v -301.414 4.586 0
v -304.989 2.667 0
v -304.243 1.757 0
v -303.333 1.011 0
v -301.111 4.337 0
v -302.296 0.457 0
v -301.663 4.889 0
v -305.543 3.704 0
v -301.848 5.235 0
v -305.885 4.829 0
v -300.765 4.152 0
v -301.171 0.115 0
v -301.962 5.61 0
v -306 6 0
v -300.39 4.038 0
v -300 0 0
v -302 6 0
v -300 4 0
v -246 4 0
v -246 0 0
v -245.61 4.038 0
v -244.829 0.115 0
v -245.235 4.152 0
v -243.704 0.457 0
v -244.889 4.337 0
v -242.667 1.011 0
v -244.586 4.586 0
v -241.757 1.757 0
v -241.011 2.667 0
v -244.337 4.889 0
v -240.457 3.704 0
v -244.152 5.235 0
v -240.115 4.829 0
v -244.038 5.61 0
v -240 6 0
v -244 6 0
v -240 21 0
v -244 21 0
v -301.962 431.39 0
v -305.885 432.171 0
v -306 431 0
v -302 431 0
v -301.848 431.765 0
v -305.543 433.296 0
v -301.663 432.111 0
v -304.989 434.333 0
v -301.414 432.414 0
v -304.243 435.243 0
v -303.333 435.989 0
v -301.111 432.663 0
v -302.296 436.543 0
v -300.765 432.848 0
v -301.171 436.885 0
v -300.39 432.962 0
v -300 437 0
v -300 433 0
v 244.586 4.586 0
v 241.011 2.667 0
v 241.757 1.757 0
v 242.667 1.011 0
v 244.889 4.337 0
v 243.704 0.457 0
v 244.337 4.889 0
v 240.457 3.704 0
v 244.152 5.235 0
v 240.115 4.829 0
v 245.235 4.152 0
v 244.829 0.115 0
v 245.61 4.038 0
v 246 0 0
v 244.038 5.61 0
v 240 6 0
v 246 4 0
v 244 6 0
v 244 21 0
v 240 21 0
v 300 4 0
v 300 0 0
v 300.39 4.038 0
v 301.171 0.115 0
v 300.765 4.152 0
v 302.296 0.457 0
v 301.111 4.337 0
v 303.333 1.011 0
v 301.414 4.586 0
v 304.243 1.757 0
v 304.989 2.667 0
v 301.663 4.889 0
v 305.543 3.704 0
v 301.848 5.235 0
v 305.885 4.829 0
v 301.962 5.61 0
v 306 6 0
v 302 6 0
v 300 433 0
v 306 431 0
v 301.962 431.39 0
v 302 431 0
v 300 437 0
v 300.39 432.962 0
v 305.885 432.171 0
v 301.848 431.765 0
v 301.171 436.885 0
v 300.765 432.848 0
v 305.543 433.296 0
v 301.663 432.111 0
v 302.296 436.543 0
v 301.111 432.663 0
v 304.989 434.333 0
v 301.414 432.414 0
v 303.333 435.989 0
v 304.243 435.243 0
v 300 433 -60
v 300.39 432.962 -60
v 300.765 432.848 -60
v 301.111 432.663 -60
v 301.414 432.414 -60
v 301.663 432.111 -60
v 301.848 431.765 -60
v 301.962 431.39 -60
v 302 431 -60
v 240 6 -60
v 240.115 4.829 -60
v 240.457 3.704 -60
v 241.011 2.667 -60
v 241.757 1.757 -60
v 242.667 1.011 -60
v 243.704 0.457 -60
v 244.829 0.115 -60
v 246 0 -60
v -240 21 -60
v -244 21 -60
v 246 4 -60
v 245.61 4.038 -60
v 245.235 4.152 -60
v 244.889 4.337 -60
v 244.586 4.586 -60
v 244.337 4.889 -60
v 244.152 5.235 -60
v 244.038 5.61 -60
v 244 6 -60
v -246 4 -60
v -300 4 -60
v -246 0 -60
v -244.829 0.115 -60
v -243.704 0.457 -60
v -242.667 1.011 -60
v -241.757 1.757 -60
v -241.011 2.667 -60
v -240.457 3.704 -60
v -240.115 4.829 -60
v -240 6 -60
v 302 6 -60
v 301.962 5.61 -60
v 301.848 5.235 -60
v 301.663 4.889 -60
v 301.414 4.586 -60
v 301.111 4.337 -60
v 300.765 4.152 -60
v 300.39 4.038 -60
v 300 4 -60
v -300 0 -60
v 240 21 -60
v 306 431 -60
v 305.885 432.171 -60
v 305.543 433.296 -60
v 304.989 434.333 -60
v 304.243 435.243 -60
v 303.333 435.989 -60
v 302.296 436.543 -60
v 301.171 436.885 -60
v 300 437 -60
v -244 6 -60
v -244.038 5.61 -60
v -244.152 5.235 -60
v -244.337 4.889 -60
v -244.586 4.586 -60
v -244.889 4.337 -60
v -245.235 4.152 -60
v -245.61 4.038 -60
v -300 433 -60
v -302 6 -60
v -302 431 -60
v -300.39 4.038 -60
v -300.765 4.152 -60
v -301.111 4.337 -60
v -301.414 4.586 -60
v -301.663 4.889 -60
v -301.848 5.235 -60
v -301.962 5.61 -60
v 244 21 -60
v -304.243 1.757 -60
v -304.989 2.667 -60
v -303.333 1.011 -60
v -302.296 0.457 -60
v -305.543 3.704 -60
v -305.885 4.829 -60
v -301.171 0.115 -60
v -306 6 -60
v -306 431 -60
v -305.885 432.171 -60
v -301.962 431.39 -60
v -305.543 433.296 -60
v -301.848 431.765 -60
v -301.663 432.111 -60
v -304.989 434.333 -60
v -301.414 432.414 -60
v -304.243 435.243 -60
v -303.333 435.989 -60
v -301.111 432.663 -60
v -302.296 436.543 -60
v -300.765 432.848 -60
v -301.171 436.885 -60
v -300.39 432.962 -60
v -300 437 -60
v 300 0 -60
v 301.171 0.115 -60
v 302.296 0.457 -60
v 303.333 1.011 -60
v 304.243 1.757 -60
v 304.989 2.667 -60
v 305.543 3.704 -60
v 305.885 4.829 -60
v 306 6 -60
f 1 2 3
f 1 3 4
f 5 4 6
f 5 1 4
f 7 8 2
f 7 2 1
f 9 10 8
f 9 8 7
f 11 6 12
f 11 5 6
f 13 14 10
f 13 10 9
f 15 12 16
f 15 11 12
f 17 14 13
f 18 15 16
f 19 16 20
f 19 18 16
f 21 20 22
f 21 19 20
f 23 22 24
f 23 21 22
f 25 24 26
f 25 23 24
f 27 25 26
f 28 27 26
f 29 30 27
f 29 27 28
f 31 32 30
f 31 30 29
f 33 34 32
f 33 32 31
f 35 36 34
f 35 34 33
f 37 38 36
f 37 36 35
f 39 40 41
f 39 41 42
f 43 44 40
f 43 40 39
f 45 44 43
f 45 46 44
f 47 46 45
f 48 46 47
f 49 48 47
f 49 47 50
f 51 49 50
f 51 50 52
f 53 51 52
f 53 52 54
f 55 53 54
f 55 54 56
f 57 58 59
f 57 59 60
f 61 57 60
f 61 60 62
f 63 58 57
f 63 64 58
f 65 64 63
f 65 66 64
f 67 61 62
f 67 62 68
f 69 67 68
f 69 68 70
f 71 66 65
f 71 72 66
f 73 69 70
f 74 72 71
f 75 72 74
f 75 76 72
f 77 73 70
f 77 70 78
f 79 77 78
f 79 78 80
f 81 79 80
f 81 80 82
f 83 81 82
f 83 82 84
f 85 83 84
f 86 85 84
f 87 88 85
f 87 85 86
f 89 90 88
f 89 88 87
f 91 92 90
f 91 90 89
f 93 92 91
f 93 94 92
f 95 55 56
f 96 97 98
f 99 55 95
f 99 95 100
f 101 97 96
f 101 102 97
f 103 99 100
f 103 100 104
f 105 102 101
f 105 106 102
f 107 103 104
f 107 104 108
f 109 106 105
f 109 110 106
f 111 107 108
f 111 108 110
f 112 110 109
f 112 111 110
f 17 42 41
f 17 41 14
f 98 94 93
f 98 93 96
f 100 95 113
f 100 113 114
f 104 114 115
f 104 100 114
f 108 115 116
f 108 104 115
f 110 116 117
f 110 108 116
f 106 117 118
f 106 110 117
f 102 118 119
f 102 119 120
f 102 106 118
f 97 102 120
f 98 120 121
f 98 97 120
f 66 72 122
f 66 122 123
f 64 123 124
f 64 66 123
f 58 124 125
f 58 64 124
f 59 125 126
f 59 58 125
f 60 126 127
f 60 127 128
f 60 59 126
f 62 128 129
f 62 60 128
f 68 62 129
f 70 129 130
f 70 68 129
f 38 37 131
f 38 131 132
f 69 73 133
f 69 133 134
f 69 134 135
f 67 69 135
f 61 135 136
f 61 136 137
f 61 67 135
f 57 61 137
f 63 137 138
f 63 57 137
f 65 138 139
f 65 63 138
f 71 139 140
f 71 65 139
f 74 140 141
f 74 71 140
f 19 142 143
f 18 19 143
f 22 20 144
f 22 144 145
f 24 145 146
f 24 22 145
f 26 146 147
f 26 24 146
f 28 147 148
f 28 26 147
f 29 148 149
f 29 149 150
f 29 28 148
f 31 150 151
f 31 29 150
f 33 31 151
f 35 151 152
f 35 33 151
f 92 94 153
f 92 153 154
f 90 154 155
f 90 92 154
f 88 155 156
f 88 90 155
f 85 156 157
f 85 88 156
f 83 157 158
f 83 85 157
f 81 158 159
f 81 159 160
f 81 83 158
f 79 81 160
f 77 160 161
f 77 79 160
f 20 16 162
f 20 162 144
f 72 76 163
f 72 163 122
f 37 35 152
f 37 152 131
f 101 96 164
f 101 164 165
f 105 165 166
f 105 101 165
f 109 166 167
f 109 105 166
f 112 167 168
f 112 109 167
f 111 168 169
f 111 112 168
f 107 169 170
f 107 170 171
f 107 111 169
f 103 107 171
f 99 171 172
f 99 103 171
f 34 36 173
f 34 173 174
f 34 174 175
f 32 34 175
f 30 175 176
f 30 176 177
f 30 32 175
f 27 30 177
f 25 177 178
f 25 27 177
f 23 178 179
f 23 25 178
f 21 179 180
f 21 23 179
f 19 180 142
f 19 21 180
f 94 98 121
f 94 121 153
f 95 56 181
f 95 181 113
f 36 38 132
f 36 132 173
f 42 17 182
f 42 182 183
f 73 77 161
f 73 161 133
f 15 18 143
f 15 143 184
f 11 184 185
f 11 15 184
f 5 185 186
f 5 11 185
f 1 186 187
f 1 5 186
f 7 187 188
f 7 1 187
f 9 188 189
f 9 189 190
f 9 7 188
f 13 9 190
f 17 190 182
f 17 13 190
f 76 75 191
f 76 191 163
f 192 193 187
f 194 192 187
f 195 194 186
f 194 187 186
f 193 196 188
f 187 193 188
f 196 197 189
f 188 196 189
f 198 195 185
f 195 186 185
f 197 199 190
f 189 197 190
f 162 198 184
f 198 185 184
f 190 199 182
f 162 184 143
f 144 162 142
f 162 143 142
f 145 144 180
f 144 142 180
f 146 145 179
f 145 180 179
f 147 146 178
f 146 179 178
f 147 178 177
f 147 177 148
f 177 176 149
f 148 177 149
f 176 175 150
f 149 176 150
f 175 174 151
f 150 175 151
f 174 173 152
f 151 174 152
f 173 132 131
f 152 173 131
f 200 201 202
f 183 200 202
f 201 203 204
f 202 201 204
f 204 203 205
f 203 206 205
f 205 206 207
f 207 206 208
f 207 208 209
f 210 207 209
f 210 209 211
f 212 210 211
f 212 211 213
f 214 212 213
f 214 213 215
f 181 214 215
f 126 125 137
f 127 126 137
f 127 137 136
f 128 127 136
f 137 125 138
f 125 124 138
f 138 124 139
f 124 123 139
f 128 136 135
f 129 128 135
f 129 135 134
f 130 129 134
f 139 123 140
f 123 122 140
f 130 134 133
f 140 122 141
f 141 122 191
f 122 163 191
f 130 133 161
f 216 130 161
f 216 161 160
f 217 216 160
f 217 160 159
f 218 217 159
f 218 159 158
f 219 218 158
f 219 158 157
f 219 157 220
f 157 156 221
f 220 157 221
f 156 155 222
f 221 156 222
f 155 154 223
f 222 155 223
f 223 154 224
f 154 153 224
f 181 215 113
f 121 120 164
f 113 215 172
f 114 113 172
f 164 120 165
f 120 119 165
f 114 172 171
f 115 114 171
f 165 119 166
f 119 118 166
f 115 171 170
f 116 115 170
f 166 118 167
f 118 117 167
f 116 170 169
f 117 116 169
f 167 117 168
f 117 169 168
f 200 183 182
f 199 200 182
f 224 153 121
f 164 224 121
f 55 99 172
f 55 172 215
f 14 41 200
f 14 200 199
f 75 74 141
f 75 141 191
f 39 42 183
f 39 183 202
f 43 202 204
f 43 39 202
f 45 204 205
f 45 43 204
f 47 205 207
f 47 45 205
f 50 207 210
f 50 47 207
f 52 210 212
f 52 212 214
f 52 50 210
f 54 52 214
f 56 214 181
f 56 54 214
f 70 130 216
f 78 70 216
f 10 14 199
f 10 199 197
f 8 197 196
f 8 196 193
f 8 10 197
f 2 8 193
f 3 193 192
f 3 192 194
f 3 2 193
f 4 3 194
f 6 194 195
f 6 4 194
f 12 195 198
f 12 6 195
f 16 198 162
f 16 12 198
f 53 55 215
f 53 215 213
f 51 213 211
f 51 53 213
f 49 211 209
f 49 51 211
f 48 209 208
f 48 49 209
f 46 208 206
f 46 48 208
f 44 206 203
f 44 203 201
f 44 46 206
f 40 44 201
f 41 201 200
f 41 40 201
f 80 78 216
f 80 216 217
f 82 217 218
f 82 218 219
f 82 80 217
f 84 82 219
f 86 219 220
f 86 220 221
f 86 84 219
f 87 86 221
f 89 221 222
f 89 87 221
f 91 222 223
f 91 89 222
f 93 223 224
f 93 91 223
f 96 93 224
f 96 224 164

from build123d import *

# Parameters (mm, degrees)
F1_DEPTH = 60


with BuildPart() as f1:
    # F0 (on Top) → F1 (new body)
    with BuildSketch(Plane.XY):
        with BuildLine():
            ThreePointArc((-306, 6), (-304.242641, 1.757359), (-300, 0))
            Line((-300, 0), (-246, 0))
            ThreePointArc((-246, 0), (-241.757359, 1.757359), (-240, 6))
            Line((-240, 6), (-240, 21))
            Line((-240, 21), (-244, 21))
            Line((-244, 21), (-244, 6))
            ThreePointArc((-244, 6), (-244.585786, 4.585786), (-246, 4))
            Line((-246, 4), (-300, 4))
            ThreePointArc((-300, 4), (-301.414214, 4.585786), (-302, 6))
            Line((-302, 6), (-302, 431))
            ThreePointArc((-302, 431), (-301.414214, 432.414214), (-300, 433))
            Line((-300, 433), (300, 433))
            ThreePointArc((300, 433), (301.414214, 432.414214), (302, 431))
            Line((302, 431), (302, 6))
            ThreePointArc((302, 6), (301.414214, 4.585786), (300, 4))
            Line((300, 4), (246, 4))
            ThreePointArc((246, 4), (244.585786, 4.585786), (244, 6))
            Line((244, 6), (244, 21))
            Line((244, 21), (240, 21))
            Line((240, 21), (240, 6))
            ThreePointArc((240, 6), (241.757359, 1.757359), (246, 0))
            Line((246, 0), (300, 0))
            ThreePointArc((300, 0), (304.242641, 1.757359), (306, 6))
            Line((306, 6), (306, 431))
            ThreePointArc((306, 431), (304.242641, 435.242641), (300, 437))
            Line((300, 437), (-300, 437))
            ThreePointArc((-300, 437), (-304.242641, 435.242641), (-306, 431))
            Line((-306, 431), (-306, 6))
        make_face()
    extrude(amount=-F1_DEPTH)


solid = f1.part
